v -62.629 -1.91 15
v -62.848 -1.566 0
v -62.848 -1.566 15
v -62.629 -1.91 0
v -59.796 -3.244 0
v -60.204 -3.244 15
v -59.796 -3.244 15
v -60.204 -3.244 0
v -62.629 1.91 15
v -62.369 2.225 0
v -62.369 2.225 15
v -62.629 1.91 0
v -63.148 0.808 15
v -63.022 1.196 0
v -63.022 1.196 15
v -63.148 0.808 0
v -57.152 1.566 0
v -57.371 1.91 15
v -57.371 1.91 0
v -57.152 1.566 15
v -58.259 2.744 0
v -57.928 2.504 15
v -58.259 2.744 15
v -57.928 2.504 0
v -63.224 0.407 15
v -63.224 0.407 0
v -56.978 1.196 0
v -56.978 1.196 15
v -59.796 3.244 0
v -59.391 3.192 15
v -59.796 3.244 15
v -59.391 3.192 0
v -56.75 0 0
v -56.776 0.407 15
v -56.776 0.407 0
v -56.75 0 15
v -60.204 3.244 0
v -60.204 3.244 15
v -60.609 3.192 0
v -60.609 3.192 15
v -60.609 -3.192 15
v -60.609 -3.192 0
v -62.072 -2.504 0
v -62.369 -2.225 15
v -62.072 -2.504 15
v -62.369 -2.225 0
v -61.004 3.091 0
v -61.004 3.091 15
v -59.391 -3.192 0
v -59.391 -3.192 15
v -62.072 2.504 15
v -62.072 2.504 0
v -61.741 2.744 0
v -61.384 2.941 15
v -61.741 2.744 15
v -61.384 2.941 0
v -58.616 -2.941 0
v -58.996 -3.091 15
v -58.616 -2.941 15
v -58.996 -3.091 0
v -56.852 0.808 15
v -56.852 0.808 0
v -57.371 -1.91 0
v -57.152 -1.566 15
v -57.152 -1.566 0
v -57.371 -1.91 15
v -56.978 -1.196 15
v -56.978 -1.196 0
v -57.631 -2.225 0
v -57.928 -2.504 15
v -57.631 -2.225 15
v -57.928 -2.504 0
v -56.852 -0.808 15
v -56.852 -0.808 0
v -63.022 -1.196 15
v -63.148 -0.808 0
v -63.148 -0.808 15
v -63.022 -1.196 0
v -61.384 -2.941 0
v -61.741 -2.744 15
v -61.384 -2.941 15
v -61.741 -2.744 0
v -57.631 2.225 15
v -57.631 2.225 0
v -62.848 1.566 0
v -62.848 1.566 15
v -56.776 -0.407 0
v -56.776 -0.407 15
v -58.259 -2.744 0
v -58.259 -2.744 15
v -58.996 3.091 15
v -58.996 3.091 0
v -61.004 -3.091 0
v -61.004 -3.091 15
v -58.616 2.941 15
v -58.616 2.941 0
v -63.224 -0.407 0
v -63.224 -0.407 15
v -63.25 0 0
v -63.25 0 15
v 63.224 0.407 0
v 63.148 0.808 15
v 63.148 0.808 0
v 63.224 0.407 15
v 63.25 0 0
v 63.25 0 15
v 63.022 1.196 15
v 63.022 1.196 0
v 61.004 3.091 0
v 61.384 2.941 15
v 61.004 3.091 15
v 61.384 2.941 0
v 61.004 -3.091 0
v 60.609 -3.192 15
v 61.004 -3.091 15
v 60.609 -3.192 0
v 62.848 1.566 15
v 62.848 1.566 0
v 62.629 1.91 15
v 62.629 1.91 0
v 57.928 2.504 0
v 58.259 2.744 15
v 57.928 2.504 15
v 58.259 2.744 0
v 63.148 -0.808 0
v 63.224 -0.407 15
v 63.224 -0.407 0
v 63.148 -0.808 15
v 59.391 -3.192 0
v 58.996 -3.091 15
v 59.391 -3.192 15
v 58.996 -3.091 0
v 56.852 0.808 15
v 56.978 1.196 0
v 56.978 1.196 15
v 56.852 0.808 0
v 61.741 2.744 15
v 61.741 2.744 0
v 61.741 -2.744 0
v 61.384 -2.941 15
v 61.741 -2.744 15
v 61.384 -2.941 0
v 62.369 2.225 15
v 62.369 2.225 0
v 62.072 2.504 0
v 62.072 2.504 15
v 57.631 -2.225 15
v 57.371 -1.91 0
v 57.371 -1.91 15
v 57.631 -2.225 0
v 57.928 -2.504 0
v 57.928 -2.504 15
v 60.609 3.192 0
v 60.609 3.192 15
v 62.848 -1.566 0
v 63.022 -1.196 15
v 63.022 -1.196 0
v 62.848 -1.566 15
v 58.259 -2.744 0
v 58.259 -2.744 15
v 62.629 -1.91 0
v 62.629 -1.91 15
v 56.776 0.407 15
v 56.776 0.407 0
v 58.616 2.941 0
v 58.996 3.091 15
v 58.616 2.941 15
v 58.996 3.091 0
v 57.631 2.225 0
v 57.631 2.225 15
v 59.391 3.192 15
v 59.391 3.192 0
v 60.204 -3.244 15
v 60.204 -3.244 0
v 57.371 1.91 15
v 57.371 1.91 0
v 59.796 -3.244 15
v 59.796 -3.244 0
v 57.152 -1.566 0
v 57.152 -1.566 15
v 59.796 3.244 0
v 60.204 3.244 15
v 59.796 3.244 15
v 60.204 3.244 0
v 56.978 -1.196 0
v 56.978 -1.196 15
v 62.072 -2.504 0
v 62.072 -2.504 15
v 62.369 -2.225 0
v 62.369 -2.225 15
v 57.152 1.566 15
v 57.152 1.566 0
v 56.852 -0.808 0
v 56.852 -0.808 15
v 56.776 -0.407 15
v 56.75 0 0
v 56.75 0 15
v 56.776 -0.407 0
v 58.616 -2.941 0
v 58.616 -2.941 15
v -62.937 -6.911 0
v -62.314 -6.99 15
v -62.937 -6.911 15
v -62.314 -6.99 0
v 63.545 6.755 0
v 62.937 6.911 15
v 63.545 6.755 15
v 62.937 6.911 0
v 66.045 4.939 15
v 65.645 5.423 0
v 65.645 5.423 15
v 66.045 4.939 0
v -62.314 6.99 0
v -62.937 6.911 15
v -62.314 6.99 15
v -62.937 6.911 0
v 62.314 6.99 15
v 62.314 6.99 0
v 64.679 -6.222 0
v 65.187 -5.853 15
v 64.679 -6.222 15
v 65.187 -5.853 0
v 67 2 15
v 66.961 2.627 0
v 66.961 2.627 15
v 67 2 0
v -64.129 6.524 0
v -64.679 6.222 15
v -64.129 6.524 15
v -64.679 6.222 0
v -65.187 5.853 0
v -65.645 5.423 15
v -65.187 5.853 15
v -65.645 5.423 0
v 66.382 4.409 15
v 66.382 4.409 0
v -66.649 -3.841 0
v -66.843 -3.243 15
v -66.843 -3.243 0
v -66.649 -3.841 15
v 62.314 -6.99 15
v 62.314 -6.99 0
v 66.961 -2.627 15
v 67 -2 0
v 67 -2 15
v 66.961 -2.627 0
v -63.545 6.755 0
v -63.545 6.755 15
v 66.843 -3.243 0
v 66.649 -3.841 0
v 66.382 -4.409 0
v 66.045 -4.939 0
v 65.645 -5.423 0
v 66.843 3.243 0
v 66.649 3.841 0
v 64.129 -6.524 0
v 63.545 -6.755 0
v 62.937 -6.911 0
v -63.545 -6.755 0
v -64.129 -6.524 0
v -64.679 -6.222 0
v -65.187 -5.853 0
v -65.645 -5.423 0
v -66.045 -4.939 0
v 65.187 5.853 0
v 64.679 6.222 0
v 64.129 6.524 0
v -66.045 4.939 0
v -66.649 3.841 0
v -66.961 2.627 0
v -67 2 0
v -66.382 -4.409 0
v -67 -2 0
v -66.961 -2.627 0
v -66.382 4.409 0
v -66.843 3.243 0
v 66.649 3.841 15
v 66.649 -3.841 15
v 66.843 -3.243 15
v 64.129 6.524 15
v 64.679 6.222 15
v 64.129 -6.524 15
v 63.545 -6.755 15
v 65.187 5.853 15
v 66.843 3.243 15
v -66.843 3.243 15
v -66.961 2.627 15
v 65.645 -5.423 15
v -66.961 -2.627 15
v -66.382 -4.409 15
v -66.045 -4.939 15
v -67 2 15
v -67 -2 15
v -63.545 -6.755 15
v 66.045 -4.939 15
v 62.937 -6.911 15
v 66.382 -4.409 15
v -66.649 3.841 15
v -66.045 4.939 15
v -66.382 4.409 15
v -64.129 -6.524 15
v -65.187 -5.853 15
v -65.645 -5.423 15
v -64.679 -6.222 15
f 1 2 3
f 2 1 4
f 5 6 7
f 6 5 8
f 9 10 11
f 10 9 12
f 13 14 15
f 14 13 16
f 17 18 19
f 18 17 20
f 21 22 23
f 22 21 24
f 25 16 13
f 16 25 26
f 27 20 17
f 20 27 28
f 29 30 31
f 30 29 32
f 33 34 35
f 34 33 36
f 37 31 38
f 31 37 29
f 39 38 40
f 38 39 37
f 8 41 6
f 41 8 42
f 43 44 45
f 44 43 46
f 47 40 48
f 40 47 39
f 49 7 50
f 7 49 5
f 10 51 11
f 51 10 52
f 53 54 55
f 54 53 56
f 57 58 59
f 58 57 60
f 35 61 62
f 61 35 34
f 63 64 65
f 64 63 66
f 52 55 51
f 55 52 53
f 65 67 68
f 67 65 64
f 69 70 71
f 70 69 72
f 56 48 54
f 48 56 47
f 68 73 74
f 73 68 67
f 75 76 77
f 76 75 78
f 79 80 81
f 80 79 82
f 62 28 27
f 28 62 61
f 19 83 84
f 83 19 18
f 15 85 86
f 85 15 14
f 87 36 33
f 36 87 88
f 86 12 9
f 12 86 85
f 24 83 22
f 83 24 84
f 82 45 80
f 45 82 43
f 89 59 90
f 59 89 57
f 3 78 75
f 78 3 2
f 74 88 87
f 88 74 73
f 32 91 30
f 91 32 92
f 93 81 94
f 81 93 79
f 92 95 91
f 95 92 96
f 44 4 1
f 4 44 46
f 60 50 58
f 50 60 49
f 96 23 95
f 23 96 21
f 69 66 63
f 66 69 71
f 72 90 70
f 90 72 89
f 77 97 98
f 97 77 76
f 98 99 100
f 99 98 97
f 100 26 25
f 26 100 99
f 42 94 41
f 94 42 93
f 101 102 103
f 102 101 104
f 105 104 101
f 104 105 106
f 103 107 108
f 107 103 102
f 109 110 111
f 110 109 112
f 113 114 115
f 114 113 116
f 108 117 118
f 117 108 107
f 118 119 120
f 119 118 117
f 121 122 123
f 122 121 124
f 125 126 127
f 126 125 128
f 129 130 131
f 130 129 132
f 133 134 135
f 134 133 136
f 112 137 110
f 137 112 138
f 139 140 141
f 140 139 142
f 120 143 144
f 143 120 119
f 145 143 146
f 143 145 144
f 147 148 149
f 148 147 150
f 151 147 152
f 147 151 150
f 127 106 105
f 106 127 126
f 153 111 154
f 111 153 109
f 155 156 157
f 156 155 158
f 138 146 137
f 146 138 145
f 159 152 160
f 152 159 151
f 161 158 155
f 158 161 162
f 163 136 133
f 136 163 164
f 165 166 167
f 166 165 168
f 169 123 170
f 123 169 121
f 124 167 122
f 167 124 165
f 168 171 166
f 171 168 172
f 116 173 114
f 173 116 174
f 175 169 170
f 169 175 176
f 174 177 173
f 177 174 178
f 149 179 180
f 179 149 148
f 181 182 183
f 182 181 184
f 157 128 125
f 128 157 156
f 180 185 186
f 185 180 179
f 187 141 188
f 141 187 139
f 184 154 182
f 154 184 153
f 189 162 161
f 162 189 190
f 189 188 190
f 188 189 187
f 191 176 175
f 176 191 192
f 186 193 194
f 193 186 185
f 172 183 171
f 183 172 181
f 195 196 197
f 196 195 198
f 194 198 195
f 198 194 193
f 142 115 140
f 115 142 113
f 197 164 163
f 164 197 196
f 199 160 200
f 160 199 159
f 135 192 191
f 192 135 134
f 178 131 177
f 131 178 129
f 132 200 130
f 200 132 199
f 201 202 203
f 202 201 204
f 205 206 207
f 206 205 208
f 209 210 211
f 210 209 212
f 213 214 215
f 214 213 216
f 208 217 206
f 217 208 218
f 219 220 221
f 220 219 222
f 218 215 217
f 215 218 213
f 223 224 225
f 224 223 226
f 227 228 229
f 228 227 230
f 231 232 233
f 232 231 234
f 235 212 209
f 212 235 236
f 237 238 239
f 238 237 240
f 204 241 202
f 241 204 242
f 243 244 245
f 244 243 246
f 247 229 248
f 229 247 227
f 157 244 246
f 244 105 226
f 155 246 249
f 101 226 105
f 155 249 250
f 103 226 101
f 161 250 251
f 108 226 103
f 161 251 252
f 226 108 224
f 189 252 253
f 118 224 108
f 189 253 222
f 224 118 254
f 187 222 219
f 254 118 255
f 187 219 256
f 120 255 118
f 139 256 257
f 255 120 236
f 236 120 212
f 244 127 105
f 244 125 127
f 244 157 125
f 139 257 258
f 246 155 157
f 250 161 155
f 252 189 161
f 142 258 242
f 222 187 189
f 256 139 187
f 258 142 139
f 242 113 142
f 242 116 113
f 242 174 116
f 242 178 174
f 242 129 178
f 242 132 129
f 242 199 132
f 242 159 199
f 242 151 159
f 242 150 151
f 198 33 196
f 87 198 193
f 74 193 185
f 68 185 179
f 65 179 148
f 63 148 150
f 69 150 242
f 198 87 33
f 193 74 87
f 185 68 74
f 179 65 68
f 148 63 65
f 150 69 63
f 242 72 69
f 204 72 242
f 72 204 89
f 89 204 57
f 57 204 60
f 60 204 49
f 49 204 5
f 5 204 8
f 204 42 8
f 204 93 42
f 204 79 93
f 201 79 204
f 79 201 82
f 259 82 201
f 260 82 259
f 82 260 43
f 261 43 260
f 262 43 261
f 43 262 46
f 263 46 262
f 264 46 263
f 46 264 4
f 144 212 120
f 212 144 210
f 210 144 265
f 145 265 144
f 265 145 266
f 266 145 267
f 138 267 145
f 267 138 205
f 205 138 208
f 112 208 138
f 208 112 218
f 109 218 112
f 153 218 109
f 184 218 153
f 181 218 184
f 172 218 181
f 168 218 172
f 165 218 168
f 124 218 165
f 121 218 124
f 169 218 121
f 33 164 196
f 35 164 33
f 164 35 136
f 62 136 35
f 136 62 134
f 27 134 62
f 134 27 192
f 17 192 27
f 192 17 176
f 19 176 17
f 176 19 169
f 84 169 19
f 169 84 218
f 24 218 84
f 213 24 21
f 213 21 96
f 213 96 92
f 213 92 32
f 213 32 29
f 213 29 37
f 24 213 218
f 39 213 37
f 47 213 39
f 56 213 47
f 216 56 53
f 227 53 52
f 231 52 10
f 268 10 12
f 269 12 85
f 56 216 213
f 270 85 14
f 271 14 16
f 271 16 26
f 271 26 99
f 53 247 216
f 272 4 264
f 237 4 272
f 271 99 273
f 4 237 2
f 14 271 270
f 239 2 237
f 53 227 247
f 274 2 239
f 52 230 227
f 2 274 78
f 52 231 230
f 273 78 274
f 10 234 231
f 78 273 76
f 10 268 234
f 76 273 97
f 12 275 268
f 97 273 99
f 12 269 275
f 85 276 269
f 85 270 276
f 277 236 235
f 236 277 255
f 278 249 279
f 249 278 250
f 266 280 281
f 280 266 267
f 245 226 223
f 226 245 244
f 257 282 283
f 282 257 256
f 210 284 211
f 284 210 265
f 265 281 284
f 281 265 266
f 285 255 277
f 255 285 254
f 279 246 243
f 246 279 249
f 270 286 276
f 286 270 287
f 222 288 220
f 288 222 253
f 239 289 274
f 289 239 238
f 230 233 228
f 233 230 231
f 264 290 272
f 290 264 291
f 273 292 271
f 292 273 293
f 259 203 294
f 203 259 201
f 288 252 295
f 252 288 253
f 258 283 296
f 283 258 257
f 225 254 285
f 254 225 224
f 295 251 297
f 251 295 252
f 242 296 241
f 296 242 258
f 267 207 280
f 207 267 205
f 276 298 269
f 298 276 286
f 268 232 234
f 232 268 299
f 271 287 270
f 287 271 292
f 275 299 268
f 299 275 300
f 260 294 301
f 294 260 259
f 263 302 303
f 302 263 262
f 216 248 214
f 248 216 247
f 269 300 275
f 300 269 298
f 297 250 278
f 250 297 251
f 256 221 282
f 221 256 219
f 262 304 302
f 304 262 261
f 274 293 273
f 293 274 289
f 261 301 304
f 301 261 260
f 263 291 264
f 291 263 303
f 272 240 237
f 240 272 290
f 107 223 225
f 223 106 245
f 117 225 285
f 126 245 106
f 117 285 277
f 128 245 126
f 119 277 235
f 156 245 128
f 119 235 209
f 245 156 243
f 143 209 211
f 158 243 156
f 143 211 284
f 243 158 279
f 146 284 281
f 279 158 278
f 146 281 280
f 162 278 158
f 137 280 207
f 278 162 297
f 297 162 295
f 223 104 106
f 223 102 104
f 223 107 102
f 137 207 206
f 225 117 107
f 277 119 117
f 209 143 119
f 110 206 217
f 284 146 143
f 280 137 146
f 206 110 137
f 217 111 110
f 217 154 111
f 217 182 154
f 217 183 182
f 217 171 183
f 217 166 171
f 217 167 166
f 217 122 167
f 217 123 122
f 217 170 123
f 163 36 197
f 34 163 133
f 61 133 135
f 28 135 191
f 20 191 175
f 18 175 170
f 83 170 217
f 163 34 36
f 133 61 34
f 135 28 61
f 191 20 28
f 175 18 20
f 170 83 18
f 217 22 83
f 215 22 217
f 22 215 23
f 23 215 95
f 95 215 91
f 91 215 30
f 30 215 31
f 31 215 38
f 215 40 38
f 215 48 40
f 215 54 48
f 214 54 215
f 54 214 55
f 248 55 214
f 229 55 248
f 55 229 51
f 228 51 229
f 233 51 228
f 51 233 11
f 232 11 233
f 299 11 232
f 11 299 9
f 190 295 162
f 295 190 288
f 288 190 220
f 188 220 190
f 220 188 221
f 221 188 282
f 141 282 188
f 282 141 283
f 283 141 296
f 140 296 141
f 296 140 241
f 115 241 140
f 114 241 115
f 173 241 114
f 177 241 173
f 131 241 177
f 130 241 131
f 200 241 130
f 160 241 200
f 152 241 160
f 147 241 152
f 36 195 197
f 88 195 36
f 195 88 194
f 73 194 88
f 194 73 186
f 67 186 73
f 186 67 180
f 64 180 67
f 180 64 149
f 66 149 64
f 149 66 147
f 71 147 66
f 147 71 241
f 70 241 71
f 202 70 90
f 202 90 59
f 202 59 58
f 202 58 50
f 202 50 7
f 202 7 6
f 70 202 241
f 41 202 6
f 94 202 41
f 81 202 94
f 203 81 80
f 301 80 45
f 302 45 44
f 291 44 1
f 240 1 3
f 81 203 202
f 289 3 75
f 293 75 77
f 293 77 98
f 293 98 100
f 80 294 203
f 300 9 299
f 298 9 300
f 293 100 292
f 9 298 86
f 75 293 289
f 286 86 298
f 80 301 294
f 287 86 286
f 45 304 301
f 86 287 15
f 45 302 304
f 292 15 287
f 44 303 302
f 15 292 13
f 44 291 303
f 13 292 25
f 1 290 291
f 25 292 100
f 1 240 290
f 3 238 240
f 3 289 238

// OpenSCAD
$fn = 50;


difference() {
	union() {
		hull() {
			translate(v = [-62.0000000000, 2.0000000000, 0]) {
				cylinder(h = 15, r = 5);
			}
			translate(v = [62.0000000000, 2.0000000000, 0]) {
				cylinder(h = 15, r = 5);
			}
			translate(v = [-62.0000000000, -2.0000000000, 0]) {
				cylinder(h = 15, r = 5);
			}
			translate(v = [62.0000000000, -2.0000000000, 0]) {
				cylinder(h = 15, r = 5);
			}
		}
	}
	union() {
		translate(v = [-60.0000000000, 0.0000000000, -100.0000000000]) {
			cylinder(h = 200, r = 3.2500000000);
		}
		translate(v = [-60.0000000000, 0.0000000000, -100.0000000000]) {
			cylinder(h = 200, r = 3.2500000000);
		}
		translate(v = [60.0000000000, 0.0000000000, -100.0000000000]) {
			cylinder(h = 200, r = 3.2500000000);
		}
		translate(v = [60.0000000000, 0.0000000000, -100.0000000000]) {
			cylinder(h = 200, r = 3.2500000000);
		}
	}
}
